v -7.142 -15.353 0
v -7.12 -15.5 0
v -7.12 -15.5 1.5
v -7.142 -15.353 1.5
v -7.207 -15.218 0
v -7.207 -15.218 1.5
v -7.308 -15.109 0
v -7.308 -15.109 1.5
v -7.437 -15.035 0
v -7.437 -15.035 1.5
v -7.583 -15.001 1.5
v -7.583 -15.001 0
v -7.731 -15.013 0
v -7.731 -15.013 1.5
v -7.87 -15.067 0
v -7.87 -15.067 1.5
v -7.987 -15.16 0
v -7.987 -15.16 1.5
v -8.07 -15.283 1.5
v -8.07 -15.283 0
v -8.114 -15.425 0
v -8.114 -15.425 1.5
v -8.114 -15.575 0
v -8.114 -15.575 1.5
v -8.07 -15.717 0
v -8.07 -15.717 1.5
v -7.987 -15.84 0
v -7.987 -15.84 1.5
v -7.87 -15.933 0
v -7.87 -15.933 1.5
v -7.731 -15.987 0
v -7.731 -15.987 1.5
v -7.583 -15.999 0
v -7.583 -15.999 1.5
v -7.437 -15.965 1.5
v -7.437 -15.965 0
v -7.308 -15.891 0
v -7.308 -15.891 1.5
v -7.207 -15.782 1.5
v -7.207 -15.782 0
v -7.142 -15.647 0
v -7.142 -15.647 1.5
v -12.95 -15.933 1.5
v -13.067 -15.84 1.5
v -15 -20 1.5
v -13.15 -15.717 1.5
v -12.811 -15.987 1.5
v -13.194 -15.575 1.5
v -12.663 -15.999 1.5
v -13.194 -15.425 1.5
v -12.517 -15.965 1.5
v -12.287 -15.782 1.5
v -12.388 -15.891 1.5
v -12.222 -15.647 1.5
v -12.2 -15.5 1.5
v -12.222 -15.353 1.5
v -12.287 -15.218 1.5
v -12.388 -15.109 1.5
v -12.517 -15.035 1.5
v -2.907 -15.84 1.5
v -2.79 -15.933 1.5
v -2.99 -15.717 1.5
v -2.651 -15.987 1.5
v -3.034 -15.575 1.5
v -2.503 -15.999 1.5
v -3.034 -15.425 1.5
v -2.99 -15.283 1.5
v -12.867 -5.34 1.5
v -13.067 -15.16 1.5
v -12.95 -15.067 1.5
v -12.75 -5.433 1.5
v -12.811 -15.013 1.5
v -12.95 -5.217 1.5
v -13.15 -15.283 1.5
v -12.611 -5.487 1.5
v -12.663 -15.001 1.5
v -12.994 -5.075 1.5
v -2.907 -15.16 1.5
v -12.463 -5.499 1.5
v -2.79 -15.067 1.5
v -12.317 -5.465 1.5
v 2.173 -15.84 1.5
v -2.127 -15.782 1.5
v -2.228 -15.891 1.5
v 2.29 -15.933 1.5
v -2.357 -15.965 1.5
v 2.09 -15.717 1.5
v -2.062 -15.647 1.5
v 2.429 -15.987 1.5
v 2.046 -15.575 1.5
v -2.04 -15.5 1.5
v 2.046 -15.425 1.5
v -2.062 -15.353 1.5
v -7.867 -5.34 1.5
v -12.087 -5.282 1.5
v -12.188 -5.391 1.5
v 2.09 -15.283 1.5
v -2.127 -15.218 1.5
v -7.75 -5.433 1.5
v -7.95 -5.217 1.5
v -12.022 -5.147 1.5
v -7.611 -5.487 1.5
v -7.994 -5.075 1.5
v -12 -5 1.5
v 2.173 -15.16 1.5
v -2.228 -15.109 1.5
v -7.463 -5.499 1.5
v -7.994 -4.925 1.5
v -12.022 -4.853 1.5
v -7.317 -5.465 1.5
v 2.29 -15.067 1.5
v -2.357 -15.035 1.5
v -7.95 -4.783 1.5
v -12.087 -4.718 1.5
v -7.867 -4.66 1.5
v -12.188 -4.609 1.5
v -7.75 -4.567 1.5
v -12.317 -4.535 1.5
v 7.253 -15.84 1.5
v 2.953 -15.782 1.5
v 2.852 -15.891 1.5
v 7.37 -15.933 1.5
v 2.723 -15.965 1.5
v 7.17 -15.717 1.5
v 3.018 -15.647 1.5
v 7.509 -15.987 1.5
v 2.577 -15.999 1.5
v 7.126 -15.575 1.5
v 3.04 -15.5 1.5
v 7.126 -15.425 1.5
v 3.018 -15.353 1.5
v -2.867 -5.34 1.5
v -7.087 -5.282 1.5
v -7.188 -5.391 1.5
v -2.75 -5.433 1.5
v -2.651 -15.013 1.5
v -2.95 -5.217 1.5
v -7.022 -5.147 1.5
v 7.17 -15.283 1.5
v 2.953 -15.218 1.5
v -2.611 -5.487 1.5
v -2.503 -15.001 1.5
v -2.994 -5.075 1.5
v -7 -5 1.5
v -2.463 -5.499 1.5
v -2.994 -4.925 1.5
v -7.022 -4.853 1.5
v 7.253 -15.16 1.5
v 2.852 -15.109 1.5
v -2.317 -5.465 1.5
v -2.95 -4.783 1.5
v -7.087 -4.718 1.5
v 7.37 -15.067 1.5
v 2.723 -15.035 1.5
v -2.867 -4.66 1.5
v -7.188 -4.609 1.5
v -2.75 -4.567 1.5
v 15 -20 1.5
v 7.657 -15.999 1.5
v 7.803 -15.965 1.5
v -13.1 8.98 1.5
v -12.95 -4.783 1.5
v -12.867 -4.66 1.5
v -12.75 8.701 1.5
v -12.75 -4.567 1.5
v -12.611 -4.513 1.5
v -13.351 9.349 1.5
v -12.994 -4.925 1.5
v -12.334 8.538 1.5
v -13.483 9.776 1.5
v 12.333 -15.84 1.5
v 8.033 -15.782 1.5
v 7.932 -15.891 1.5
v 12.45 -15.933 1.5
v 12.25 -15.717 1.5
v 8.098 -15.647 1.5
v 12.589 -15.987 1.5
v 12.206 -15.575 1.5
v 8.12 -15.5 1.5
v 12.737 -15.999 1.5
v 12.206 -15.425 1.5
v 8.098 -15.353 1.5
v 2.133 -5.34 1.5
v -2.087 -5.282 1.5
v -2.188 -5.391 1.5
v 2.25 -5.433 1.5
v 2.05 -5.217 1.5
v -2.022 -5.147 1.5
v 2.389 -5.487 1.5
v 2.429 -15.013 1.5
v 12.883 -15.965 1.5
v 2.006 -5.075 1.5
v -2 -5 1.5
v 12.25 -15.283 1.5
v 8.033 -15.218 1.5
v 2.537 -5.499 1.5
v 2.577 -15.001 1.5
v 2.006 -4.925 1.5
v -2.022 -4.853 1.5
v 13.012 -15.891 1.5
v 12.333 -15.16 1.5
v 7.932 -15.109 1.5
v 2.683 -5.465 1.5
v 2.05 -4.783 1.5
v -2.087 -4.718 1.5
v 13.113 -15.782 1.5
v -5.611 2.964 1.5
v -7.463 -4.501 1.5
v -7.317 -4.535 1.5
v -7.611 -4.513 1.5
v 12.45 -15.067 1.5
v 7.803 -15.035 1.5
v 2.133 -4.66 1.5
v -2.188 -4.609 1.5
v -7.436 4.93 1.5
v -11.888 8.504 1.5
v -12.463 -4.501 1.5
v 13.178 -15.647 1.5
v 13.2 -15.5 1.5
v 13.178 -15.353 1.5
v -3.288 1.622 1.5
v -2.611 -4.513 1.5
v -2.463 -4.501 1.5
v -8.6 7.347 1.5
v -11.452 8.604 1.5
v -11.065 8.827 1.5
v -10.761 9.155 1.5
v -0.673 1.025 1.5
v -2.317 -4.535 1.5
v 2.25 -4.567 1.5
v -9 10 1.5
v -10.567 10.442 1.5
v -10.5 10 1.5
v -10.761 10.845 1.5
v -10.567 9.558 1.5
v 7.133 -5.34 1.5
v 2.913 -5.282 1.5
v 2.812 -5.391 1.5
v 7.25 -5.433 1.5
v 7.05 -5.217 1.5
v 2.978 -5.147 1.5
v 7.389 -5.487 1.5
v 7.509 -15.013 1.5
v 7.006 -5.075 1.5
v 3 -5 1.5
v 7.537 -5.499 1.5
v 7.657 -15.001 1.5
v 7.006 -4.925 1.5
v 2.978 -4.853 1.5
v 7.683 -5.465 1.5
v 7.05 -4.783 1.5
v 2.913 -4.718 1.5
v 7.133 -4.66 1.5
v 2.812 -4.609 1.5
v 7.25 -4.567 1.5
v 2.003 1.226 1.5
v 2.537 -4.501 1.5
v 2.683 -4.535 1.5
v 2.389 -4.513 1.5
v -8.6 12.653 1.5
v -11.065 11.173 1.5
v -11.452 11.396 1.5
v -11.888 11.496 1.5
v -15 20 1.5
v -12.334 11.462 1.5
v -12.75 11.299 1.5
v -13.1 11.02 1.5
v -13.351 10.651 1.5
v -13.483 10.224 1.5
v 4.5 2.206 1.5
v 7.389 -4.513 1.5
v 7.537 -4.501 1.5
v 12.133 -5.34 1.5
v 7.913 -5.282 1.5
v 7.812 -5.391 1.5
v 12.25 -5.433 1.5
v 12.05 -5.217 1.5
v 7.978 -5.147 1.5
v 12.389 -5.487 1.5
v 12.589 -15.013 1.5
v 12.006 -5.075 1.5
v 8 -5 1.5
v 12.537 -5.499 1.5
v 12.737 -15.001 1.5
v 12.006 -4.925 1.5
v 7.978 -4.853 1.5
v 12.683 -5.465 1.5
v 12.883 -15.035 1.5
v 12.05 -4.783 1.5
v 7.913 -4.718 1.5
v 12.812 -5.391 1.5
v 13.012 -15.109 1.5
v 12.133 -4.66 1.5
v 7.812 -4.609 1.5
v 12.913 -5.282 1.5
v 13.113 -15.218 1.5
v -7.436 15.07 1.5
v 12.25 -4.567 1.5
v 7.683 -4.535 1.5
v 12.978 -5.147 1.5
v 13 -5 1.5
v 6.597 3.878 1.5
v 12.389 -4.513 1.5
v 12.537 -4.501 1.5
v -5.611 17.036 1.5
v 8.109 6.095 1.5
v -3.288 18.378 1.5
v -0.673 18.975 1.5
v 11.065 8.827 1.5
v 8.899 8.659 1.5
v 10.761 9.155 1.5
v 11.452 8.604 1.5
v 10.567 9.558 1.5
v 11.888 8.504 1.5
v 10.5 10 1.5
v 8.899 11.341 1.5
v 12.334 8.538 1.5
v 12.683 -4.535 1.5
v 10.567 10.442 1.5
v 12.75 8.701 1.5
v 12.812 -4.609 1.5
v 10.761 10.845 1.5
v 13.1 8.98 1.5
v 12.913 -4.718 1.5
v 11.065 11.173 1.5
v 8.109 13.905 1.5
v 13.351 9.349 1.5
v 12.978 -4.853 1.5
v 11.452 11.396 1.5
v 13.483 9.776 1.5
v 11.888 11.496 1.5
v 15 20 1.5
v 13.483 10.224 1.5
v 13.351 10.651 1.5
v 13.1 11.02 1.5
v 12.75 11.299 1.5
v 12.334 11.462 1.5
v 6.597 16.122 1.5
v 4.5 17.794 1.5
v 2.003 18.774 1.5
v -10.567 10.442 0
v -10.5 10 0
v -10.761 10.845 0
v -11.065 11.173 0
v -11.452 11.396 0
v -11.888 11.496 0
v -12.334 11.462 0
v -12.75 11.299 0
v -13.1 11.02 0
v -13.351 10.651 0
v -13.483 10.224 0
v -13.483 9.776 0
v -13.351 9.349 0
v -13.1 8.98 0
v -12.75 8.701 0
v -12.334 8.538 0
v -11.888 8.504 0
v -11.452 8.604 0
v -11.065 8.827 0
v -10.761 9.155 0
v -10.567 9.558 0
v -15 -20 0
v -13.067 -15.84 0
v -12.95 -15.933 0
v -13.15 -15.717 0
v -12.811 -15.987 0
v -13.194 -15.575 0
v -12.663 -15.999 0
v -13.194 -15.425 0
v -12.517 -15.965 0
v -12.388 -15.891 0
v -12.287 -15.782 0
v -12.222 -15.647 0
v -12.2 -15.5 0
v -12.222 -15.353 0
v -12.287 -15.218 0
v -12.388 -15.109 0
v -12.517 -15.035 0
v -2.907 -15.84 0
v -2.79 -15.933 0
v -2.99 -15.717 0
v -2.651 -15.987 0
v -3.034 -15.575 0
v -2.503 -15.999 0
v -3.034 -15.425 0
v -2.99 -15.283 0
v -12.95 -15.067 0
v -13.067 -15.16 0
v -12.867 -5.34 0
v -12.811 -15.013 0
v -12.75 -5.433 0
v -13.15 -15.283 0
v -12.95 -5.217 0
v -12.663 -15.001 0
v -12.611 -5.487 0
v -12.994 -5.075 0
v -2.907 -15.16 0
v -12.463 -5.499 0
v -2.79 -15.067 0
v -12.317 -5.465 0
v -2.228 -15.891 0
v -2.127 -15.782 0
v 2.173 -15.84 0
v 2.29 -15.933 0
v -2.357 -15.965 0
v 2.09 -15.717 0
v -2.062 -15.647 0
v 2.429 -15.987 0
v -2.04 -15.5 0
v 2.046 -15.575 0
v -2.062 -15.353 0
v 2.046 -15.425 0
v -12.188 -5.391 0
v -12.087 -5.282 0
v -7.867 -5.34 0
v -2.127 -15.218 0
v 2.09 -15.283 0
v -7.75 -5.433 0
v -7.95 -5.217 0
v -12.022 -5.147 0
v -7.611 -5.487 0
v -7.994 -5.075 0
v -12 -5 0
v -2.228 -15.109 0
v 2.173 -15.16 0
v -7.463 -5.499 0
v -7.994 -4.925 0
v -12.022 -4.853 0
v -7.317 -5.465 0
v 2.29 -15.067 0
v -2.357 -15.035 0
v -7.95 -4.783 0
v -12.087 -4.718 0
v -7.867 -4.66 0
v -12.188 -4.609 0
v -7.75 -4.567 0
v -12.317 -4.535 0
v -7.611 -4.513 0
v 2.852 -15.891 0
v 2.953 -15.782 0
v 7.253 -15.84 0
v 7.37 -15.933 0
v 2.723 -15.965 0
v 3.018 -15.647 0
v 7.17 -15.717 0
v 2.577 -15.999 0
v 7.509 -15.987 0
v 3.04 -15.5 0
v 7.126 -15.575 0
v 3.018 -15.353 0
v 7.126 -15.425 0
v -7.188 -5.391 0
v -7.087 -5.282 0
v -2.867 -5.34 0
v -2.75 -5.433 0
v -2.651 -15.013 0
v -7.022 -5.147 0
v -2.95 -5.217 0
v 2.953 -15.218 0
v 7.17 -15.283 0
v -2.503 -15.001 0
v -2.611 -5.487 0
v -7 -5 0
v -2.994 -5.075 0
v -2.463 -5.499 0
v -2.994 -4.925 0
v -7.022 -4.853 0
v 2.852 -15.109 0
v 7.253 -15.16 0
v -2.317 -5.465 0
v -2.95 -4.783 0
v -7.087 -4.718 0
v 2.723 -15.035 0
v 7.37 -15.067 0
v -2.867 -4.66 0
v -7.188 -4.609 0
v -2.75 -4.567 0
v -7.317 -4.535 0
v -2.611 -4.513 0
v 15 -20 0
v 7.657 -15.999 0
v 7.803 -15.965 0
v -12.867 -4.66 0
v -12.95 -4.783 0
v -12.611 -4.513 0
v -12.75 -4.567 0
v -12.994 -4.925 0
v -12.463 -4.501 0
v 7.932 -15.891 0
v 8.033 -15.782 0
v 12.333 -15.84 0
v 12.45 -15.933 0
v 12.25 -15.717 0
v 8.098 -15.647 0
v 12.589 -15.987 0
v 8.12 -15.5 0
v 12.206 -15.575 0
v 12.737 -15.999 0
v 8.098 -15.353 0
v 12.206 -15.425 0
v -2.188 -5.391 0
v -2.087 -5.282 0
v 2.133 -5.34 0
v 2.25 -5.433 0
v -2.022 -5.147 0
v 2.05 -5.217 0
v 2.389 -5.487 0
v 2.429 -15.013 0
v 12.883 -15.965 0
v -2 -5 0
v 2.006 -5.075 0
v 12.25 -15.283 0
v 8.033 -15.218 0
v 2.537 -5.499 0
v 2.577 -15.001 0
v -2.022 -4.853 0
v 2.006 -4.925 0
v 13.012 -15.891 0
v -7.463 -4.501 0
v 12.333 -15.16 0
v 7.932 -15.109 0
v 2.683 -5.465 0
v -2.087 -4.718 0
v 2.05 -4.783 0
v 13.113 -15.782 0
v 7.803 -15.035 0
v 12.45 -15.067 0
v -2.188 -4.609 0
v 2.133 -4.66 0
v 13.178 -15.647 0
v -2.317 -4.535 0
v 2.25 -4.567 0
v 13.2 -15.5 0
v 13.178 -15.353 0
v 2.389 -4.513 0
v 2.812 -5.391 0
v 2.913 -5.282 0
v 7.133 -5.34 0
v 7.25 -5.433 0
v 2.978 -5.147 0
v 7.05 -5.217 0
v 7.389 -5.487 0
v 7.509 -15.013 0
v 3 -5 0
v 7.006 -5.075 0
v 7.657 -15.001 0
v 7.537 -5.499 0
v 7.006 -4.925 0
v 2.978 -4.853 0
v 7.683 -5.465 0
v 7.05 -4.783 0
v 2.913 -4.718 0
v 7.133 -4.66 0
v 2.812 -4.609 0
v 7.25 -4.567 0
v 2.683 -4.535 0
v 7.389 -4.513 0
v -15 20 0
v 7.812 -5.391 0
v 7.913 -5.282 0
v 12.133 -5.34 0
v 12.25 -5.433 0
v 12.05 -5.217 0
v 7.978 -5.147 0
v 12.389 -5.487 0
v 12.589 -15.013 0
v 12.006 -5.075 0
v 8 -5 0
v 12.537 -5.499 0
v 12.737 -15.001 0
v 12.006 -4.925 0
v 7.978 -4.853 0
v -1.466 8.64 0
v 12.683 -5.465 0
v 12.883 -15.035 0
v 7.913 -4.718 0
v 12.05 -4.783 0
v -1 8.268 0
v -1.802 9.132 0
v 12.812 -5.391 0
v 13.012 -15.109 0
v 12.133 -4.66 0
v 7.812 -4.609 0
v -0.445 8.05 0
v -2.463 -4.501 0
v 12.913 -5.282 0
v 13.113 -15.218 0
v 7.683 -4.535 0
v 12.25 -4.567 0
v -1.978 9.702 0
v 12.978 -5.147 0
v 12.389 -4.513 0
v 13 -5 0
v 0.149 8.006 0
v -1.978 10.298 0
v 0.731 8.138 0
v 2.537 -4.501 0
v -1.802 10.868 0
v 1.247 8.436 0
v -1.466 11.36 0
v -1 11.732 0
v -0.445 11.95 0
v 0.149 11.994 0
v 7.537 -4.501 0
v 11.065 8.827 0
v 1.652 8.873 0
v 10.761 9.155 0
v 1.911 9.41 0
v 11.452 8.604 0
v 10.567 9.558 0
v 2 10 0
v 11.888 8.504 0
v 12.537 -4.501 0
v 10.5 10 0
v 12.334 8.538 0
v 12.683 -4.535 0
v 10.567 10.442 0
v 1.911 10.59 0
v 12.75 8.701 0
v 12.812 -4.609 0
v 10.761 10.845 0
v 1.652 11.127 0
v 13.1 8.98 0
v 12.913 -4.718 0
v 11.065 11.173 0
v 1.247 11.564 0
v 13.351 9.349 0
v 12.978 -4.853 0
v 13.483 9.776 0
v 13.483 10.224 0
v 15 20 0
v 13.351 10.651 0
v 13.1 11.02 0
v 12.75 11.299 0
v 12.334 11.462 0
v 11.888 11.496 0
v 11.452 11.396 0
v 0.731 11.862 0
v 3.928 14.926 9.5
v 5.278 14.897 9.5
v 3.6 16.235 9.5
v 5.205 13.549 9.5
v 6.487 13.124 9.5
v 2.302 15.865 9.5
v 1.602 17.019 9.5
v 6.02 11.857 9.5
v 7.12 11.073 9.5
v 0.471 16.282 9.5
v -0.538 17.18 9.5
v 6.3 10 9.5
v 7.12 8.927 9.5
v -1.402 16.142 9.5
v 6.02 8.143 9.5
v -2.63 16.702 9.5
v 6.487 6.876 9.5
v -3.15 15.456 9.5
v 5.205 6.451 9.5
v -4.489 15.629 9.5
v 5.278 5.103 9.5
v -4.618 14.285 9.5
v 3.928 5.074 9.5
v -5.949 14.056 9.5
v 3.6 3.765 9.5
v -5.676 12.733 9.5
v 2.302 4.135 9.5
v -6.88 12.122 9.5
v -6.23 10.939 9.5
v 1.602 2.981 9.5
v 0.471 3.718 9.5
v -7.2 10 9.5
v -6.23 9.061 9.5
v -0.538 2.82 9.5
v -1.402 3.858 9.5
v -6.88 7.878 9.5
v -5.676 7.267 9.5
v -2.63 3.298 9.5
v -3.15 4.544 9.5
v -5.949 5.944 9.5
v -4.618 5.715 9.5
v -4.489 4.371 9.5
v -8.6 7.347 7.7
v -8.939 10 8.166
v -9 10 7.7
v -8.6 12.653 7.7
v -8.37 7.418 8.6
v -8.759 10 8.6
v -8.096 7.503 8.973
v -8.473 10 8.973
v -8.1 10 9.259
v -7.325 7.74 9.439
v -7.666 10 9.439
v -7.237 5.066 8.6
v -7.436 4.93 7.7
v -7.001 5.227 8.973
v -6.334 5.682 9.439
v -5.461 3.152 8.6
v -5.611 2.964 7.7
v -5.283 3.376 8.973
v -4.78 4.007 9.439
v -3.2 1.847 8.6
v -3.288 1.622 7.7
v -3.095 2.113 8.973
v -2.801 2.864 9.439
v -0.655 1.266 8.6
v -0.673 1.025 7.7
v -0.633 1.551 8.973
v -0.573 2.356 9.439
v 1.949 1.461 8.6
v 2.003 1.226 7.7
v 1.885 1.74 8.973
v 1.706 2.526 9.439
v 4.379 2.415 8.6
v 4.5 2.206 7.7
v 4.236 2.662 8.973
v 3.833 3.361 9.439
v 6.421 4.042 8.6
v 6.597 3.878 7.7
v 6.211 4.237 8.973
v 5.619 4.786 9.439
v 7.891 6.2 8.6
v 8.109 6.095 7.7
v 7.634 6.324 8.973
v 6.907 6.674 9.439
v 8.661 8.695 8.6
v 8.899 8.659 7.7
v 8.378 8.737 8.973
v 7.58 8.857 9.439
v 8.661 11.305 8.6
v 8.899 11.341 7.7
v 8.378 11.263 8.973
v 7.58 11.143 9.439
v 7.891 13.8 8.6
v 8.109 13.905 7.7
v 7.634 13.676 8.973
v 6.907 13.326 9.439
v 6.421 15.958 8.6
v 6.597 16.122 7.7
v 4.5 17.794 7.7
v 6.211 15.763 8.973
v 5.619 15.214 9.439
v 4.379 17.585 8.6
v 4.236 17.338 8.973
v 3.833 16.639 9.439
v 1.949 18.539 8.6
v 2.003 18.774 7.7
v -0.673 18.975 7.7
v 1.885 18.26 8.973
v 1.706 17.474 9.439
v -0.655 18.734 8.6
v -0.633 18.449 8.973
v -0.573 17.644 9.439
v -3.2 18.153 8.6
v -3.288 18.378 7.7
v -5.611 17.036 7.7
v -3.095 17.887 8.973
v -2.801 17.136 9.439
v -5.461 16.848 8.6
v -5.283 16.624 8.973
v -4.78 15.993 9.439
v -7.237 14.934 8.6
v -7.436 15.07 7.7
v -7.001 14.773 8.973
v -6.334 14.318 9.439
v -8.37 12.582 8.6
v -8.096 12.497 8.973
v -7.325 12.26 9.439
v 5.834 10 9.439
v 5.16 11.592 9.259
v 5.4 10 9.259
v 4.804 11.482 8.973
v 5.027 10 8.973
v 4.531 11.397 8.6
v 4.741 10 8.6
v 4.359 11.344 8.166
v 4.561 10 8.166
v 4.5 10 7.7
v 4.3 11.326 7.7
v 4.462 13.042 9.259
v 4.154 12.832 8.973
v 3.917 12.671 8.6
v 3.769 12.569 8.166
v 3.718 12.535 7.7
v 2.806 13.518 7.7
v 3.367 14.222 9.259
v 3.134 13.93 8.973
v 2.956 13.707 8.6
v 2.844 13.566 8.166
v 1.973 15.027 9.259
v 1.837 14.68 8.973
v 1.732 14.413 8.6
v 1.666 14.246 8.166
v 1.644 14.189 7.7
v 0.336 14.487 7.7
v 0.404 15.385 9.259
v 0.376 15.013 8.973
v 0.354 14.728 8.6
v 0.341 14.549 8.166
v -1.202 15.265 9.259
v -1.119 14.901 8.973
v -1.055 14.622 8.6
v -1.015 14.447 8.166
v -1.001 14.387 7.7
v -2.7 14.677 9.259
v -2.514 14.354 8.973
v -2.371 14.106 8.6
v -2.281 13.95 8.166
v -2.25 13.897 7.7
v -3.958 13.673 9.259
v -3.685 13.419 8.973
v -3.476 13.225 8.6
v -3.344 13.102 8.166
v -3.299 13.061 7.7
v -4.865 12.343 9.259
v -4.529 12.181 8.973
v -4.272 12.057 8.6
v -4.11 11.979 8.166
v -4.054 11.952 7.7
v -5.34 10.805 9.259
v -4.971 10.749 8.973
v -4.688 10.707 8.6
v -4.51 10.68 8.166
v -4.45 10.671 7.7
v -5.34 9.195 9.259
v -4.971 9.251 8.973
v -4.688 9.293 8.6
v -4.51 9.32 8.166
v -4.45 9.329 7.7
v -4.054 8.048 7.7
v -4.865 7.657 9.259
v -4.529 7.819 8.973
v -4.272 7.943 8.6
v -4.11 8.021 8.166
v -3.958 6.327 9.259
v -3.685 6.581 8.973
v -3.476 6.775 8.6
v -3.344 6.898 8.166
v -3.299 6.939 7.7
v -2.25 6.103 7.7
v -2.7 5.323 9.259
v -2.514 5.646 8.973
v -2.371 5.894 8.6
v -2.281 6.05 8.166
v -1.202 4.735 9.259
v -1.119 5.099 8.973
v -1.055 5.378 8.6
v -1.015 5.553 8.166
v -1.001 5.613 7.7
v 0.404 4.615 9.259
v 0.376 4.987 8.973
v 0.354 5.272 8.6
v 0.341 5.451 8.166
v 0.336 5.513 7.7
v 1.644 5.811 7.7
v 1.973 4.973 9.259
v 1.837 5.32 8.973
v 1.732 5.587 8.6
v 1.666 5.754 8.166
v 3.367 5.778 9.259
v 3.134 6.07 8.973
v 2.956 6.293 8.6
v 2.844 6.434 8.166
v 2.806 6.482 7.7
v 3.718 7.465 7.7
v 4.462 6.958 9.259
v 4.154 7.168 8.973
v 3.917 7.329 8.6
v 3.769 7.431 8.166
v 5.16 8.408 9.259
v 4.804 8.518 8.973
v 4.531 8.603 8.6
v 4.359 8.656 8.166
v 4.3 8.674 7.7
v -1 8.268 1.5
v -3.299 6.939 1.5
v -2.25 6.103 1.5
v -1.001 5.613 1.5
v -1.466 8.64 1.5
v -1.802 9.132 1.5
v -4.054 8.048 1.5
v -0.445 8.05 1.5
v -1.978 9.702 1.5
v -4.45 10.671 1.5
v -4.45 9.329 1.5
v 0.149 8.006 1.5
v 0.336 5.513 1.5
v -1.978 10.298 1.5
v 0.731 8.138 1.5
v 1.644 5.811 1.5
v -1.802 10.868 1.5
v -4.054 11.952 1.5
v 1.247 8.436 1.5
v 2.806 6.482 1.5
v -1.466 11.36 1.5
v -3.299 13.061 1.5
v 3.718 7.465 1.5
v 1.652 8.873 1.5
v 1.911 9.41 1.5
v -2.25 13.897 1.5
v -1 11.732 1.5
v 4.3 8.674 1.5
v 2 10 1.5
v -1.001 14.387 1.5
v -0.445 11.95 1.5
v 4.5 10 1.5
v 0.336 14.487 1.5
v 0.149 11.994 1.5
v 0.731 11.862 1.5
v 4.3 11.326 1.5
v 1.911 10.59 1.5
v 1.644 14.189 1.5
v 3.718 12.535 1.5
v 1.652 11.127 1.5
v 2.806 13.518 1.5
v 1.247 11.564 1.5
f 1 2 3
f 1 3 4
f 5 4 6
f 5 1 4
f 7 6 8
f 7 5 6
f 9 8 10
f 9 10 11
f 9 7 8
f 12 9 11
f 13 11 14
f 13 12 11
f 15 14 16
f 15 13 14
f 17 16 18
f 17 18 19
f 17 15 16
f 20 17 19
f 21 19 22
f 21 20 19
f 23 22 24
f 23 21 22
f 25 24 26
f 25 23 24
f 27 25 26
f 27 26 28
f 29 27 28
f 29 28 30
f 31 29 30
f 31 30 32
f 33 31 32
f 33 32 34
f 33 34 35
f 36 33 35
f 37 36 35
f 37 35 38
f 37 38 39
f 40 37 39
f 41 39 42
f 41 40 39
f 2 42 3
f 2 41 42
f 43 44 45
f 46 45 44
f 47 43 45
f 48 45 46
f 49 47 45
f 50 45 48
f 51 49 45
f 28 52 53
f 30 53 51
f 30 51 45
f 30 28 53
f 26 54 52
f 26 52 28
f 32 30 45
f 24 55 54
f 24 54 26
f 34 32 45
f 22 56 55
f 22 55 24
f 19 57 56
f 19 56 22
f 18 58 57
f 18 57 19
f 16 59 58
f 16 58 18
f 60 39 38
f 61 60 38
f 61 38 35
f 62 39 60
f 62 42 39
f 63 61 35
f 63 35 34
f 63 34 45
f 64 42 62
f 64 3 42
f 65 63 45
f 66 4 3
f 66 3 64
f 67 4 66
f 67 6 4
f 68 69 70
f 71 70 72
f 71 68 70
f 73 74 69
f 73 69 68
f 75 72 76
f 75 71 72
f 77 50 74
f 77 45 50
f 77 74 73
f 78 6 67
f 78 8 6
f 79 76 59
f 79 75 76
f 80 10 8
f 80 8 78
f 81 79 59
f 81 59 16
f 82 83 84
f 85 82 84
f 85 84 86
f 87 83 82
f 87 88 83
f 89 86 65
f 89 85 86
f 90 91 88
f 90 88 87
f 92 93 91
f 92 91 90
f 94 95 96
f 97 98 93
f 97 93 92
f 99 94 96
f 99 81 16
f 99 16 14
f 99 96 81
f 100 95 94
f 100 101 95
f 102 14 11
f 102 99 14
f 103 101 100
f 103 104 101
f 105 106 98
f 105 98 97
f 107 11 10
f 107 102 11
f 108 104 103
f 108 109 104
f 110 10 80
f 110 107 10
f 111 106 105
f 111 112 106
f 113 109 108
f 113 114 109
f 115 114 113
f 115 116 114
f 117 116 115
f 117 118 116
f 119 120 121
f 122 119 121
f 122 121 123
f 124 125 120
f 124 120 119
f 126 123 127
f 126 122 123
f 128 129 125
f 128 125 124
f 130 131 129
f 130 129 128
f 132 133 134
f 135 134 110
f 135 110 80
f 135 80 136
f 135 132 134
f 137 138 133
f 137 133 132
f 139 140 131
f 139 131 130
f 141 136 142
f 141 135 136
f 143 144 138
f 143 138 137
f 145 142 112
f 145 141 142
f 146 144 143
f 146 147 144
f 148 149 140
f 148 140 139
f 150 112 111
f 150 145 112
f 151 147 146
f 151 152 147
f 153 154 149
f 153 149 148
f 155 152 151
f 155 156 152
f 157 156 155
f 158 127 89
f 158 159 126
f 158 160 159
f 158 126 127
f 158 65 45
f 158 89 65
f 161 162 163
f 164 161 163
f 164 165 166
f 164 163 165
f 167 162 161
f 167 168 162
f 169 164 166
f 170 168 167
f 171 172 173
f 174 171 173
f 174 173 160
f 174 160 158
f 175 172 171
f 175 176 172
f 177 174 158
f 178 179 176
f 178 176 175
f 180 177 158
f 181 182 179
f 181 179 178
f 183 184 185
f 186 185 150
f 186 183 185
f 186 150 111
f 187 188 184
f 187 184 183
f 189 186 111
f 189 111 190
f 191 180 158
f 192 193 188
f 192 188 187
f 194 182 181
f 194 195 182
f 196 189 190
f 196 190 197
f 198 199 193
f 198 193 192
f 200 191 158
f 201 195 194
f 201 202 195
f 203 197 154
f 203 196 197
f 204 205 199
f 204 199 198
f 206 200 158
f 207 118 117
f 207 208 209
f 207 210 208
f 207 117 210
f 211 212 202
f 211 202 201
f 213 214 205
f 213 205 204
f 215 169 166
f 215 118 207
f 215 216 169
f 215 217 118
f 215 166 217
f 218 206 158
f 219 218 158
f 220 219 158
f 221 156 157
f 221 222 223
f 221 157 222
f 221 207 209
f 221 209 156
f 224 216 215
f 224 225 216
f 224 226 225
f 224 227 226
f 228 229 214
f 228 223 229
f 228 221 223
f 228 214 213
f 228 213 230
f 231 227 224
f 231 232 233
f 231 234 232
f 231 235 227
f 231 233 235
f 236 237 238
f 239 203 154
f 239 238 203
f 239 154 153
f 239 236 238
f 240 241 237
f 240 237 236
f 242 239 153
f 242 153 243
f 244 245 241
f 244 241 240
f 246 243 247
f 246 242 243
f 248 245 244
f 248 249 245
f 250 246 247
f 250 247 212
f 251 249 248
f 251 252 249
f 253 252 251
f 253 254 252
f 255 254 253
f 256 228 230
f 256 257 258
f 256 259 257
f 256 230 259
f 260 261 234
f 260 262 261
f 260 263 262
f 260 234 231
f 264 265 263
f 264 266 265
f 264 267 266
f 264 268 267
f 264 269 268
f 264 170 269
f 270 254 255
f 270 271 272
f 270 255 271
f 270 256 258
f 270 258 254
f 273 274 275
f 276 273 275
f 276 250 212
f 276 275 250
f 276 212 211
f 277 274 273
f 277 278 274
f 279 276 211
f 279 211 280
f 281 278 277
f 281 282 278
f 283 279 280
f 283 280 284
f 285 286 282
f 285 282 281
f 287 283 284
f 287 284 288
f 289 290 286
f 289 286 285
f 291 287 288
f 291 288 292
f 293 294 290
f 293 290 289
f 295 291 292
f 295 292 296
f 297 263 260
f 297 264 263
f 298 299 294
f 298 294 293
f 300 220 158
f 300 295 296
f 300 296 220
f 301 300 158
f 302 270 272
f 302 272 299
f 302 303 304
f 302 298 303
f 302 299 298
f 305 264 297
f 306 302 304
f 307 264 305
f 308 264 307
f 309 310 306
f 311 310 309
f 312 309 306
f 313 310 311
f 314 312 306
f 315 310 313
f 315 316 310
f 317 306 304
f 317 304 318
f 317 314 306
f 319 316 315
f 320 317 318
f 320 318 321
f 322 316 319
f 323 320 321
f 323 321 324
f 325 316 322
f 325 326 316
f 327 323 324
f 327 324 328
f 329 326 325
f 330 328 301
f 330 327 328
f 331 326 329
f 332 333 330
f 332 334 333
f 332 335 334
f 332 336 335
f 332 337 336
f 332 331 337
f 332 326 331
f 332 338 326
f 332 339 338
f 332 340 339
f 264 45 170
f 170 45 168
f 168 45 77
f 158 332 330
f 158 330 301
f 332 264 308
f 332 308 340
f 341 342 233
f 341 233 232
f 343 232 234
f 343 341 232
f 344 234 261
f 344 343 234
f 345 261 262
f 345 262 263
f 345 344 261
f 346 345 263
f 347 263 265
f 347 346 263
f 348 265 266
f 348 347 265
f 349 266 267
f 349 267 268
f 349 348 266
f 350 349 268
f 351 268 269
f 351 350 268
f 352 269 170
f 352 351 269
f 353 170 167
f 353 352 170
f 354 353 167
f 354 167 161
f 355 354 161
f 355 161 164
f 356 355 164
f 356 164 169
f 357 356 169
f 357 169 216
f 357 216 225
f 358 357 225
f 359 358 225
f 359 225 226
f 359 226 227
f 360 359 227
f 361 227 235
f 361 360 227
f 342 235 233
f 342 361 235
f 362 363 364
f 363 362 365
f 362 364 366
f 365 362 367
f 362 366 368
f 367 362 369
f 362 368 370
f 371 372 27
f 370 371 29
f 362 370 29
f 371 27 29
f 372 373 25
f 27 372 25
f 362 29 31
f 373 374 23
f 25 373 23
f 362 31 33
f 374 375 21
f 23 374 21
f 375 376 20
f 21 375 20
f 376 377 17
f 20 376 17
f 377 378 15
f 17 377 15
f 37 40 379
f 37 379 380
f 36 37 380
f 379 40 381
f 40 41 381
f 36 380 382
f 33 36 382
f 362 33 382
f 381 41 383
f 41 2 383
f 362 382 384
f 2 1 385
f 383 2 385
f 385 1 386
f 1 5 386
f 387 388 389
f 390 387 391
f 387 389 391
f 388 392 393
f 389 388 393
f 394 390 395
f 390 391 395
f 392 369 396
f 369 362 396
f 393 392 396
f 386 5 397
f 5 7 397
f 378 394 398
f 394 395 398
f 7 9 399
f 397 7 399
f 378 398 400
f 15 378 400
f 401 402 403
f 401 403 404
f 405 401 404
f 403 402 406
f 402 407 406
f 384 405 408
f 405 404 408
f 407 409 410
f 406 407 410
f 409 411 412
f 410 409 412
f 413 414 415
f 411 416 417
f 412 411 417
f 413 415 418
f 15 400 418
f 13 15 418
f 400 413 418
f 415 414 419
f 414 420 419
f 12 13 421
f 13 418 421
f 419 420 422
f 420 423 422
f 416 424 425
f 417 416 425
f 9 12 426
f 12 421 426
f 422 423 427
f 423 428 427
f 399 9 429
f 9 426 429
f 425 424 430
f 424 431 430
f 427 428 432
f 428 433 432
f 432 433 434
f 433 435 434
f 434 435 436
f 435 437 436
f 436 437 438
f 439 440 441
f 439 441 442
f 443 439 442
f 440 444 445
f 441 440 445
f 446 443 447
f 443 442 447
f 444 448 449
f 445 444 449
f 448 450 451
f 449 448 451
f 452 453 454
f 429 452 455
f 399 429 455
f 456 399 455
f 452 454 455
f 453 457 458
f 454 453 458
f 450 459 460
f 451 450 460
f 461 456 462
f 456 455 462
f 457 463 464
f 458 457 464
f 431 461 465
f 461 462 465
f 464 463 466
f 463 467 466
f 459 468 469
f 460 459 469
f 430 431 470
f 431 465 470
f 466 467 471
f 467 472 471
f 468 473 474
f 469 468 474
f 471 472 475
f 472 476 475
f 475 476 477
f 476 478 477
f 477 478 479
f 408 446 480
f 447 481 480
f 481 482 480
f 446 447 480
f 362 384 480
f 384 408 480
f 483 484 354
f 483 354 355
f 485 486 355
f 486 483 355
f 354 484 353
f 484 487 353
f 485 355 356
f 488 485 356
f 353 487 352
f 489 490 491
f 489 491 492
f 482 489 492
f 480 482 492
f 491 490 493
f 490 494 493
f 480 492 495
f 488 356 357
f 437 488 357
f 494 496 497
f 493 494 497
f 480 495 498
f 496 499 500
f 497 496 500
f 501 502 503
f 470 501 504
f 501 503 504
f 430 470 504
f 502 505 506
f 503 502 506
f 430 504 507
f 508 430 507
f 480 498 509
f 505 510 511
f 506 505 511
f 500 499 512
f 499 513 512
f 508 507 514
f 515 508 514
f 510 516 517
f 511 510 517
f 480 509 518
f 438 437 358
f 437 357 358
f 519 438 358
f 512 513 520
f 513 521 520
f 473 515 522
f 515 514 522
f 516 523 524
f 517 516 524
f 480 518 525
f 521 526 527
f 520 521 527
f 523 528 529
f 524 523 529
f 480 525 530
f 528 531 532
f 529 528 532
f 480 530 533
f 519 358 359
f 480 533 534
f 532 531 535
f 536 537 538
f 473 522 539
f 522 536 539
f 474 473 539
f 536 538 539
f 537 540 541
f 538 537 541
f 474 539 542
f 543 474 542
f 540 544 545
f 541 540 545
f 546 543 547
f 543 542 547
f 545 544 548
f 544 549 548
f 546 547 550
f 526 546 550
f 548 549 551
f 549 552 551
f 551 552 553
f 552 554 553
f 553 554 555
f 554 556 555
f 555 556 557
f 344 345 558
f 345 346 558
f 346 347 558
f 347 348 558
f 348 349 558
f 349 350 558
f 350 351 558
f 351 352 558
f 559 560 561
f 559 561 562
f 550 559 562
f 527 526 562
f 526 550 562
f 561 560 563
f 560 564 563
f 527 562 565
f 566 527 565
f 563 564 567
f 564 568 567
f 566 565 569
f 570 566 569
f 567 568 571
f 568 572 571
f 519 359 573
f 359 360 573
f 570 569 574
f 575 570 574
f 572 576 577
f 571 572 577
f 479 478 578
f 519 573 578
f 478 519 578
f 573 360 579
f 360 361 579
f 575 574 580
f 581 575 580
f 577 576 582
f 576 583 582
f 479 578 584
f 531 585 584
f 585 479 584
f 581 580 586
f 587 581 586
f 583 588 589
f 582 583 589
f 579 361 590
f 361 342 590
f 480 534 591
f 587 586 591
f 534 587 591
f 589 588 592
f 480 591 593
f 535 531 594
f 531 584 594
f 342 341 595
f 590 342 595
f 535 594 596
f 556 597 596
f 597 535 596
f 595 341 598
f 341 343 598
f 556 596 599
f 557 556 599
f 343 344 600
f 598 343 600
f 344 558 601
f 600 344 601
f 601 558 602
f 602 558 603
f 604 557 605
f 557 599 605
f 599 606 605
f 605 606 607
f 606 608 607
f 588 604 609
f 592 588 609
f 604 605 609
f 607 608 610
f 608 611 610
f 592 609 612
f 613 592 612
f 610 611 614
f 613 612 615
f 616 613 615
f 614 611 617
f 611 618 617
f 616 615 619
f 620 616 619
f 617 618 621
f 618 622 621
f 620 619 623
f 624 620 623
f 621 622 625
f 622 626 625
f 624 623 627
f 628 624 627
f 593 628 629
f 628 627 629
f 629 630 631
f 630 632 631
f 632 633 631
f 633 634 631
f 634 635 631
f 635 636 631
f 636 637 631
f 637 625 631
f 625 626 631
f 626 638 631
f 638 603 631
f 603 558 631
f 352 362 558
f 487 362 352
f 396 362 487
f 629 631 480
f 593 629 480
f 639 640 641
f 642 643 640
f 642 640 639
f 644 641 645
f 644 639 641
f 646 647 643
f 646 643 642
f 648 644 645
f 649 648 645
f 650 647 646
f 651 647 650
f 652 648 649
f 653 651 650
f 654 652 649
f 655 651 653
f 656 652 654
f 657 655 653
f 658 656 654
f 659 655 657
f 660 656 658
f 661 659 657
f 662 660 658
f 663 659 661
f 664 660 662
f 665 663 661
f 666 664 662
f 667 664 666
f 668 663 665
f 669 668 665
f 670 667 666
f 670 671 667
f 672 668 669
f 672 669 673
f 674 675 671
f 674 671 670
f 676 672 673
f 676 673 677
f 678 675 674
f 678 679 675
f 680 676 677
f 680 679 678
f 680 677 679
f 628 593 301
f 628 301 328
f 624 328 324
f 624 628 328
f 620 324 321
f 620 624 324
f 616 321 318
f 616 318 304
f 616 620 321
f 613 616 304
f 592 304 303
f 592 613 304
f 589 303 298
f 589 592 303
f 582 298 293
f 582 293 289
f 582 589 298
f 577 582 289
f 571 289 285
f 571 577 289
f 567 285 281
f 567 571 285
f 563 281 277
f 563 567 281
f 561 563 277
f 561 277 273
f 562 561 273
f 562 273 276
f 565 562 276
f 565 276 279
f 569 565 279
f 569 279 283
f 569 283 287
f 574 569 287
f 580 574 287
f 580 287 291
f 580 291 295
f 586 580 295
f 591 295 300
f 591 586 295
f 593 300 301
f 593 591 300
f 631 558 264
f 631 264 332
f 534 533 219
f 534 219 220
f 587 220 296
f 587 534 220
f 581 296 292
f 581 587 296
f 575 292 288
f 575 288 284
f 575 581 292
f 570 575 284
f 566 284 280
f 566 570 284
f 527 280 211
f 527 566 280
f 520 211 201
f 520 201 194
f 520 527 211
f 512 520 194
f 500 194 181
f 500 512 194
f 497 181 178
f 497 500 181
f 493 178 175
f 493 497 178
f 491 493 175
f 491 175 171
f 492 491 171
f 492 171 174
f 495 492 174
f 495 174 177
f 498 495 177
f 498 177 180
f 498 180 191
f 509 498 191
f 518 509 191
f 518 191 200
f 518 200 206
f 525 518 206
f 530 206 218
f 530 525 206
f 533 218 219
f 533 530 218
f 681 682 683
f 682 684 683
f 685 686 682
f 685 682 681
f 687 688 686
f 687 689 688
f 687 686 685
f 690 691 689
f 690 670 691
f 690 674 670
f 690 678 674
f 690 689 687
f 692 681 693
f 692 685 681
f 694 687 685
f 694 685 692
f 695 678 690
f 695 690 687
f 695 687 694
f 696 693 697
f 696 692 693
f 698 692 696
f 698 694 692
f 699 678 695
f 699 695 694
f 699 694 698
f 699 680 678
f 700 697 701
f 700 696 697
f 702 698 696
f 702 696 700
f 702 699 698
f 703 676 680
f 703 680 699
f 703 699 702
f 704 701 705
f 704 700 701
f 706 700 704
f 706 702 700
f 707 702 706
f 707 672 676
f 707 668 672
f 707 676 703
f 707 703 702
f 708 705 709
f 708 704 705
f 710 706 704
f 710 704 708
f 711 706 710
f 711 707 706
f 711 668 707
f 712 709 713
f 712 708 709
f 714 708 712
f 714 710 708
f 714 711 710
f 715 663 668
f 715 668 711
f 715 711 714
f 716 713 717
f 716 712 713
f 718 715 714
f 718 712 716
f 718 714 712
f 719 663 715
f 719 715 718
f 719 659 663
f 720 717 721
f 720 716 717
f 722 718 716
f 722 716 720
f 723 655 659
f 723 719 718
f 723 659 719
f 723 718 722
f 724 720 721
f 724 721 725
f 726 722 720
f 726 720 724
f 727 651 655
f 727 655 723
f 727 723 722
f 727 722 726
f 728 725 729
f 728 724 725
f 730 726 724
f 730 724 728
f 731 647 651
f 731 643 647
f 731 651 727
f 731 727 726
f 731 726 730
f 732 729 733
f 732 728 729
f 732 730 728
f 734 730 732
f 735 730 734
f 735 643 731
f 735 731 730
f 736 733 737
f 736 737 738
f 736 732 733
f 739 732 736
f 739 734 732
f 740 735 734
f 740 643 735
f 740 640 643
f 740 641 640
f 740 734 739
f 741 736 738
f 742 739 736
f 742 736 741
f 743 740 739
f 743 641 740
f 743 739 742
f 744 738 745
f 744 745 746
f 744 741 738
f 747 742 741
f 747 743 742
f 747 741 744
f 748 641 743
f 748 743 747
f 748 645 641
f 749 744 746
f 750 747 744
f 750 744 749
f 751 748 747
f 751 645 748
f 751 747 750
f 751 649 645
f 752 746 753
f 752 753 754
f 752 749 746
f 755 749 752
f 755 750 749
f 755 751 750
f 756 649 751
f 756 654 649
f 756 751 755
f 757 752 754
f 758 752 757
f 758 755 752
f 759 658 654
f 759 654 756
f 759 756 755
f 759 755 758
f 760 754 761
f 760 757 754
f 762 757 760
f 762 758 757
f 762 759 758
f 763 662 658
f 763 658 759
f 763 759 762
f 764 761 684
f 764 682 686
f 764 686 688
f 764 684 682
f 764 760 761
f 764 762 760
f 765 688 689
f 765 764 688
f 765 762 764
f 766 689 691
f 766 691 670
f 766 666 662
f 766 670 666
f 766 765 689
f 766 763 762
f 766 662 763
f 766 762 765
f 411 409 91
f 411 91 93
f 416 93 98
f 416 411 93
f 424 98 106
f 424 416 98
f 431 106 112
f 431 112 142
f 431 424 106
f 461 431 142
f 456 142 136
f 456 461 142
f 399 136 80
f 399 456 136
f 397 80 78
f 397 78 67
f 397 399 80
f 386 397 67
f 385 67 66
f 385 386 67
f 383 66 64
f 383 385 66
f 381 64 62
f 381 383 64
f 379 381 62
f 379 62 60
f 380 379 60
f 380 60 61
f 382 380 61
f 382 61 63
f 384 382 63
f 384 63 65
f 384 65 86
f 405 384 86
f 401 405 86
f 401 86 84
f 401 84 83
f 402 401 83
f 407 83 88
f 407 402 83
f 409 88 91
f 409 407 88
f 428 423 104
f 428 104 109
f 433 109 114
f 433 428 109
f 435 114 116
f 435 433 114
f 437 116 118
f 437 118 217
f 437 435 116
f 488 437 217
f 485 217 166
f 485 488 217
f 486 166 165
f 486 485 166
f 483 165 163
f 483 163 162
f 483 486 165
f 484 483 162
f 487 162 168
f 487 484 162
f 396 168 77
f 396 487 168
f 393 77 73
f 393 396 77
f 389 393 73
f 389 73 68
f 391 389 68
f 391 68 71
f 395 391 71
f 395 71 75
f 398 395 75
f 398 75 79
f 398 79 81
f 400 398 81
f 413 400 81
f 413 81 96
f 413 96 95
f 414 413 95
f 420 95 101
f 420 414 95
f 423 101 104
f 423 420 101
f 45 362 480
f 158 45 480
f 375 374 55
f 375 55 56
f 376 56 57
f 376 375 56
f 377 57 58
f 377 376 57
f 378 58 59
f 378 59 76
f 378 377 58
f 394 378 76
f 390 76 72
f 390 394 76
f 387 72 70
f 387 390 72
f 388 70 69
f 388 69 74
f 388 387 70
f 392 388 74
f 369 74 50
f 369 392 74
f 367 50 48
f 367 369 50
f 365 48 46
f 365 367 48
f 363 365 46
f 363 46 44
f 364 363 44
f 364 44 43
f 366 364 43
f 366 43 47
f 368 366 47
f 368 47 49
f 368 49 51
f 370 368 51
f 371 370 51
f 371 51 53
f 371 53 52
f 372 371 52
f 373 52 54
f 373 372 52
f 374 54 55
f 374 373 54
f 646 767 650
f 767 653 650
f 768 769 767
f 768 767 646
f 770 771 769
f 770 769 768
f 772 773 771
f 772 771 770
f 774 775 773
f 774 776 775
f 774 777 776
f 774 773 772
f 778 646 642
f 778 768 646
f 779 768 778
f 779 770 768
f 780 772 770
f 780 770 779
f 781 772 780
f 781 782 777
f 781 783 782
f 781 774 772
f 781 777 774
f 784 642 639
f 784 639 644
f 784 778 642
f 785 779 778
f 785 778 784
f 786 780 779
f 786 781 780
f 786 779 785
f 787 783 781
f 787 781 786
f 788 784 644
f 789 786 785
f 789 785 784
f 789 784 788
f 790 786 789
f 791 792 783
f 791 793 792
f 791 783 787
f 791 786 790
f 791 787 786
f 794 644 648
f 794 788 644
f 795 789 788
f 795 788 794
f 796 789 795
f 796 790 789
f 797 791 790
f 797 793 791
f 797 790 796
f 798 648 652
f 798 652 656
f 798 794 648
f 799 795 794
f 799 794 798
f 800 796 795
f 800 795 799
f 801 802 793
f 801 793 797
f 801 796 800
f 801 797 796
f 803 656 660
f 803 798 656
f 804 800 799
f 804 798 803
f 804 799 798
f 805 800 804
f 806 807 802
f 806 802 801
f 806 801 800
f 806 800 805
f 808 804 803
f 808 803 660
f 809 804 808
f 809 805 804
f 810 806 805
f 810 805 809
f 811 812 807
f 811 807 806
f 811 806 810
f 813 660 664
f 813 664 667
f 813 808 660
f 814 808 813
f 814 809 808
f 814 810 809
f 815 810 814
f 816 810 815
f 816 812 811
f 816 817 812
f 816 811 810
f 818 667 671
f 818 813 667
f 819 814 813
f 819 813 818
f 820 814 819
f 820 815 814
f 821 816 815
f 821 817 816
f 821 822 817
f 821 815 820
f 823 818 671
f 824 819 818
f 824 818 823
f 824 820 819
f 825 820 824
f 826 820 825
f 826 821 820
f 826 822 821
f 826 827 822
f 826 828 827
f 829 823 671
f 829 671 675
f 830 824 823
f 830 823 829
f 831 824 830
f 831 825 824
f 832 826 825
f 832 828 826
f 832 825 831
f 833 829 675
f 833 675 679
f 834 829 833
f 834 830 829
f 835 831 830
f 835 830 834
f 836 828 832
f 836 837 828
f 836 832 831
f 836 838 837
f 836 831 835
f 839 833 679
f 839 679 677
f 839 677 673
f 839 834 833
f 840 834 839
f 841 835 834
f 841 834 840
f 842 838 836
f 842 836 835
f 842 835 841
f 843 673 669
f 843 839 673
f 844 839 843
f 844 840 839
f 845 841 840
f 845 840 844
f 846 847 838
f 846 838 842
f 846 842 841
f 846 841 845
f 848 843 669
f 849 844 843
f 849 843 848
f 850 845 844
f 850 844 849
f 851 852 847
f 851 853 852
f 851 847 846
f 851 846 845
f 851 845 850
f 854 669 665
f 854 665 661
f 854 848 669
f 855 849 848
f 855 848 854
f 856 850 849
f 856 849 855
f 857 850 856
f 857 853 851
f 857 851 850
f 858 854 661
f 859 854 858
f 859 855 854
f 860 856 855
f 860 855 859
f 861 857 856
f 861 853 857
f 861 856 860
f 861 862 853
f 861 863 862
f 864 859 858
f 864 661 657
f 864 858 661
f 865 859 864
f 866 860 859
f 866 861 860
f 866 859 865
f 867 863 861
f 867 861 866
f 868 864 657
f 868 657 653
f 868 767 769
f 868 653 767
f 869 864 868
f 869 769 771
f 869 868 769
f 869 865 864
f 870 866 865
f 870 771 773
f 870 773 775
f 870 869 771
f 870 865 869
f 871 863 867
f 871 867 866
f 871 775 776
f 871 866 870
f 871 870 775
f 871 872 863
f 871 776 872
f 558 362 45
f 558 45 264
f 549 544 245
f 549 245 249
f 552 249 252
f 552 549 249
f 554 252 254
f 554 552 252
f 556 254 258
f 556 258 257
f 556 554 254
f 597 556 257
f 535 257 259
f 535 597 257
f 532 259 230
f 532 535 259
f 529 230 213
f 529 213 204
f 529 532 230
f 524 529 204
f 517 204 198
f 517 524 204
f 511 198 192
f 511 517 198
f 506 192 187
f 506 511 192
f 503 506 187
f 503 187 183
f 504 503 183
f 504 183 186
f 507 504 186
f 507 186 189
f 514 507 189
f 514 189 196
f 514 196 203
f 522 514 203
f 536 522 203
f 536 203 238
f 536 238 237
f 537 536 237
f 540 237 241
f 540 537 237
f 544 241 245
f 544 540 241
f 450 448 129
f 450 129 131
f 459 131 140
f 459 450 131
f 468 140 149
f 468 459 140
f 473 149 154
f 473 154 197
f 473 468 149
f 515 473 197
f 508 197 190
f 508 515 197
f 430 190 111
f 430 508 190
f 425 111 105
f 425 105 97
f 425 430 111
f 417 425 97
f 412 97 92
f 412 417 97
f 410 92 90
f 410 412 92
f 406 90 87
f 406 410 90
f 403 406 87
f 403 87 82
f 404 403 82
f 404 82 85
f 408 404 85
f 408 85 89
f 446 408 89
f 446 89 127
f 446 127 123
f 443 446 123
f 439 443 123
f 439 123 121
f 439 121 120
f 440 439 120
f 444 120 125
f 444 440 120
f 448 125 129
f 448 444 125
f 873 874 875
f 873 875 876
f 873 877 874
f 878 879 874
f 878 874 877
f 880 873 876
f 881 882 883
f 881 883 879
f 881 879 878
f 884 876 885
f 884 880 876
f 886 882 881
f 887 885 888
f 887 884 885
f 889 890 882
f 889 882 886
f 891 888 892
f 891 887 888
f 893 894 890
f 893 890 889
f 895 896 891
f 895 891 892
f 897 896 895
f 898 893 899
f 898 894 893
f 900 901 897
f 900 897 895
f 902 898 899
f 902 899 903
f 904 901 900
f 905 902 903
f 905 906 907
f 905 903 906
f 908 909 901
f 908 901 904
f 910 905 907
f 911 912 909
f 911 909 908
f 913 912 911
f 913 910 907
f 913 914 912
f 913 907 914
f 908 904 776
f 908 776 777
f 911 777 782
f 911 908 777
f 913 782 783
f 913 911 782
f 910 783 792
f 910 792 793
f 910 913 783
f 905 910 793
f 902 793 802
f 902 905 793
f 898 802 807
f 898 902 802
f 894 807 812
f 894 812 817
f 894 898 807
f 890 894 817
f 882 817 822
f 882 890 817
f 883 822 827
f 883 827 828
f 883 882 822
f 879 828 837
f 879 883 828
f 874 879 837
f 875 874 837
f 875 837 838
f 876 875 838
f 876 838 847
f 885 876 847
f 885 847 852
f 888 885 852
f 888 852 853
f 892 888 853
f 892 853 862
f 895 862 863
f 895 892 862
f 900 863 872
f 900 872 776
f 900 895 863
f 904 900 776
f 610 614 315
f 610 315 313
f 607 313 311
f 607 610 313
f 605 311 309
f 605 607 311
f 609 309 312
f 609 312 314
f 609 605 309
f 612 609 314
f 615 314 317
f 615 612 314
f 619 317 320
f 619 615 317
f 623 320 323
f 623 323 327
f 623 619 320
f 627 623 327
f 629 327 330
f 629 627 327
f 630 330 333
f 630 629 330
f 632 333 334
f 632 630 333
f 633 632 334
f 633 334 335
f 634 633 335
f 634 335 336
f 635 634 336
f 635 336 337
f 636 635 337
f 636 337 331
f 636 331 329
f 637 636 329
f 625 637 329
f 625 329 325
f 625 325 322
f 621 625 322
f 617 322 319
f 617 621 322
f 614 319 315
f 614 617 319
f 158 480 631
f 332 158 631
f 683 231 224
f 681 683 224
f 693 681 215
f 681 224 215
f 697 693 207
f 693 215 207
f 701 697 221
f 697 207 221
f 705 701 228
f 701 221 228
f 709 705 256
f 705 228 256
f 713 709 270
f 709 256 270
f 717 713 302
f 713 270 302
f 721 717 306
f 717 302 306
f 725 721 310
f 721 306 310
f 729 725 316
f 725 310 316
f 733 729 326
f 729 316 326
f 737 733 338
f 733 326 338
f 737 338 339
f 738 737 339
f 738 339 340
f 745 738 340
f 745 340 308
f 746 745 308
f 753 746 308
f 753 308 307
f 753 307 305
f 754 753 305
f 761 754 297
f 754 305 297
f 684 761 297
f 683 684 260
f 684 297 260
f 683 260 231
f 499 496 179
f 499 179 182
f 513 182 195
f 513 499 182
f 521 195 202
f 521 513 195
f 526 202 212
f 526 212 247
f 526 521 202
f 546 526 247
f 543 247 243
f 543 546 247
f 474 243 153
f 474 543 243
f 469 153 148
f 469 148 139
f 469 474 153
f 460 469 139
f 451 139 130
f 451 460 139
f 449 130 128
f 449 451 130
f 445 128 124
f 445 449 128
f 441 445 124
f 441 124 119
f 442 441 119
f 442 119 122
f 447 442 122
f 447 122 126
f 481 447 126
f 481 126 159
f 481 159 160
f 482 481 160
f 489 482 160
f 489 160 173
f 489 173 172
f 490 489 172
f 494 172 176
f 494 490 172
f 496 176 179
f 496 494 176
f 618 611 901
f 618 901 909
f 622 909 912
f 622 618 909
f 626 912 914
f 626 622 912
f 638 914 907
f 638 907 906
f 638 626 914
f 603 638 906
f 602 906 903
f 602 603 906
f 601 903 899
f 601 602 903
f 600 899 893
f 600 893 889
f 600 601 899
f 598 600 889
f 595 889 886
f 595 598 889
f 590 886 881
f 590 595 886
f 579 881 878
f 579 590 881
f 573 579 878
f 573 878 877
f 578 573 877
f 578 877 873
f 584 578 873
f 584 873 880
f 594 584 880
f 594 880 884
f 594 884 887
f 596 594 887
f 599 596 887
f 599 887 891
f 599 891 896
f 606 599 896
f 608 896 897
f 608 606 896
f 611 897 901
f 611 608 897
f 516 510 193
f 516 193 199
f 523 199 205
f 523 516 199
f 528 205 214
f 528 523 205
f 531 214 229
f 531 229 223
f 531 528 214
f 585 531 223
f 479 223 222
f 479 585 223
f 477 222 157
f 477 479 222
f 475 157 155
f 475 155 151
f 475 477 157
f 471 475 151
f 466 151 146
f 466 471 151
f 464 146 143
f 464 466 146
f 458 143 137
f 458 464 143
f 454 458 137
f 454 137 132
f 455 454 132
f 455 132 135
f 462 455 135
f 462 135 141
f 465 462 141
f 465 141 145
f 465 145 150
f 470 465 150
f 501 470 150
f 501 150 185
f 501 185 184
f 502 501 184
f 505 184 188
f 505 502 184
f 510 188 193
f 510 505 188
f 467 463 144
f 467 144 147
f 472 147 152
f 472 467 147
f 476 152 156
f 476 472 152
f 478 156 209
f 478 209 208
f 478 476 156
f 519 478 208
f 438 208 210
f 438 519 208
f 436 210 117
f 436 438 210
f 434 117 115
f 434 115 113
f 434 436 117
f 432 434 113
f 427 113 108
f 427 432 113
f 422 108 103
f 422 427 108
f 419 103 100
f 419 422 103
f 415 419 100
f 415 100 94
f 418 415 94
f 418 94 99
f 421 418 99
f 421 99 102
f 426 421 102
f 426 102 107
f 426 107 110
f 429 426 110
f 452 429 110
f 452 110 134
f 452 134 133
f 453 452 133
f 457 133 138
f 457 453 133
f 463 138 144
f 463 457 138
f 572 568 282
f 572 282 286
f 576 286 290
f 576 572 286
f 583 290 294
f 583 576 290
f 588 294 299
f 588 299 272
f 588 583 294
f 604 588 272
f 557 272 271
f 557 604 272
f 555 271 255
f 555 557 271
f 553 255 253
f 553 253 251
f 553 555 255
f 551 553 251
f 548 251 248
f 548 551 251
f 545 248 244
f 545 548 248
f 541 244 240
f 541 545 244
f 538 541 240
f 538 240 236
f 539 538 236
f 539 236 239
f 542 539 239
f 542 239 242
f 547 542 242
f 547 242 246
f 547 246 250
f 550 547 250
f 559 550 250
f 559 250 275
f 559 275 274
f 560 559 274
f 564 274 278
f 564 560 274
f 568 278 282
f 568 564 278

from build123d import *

# Parameters (mm, degrees)
SKETCH_1_W      = 30
SKETCH_1_H      = 40
SKETCH_1_R      = 0.5
SKETCH_1_R_2    = 2
SKETCH_1_R_3    = 1.5
EXTRUDE_1_DEPTH = 1.5
SKETCH_2_R      = 9
SKETCH_2_R_2    = 4.5
EXTRUDE_2_DEPTH = 8
FILLET_1_R      = 1.8


with BuildPart() as part:
    # Эскиз1 → Вытянуть1 (new body)
    with BuildSketch(Plane.XY):
        Rectangle(SKETCH_1_W, SKETCH_1_H)
        with Locations((-12.7, -15.5)):
            Circle(SKETCH_1_R, mode=Mode.SUBTRACT)
        with Locations((-12.5, -5)):
            Circle(SKETCH_1_R, mode=Mode.SUBTRACT)
        with Locations((-7.62, -15.5)):
            Circle(SKETCH_1_R, mode=Mode.SUBTRACT)
        with Locations((-2.54, -15.5)):
            Circle(SKETCH_1_R, mode=Mode.SUBTRACT)
        with Locations((2.54, -15.5)):
            Circle(SKETCH_1_R, mode=Mode.SUBTRACT)
        with Locations((7.62, -15.5)):
            Circle(SKETCH_1_R, mode=Mode.SUBTRACT)
        with Locations((12.7, -15.5)):
            Circle(SKETCH_1_R, mode=Mode.SUBTRACT)
        with Locations((-7.5, -5)):
            Circle(SKETCH_1_R, mode=Mode.SUBTRACT)
        with Locations((-2.5, -5)):
            Circle(SKETCH_1_R, mode=Mode.SUBTRACT)
        with Locations((2.5, -5)):
            Circle(SKETCH_1_R, mode=Mode.SUBTRACT)
        with Locations((7.5, -5)):
            Circle(SKETCH_1_R, mode=Mode.SUBTRACT)
        with Locations((12.5, -5)):
            Circle(SKETCH_1_R, mode=Mode.SUBTRACT)
        with Locations((0, 10)):
            Circle(SKETCH_1_R_2, mode=Mode.SUBTRACT)
        with Locations((-12, 10)):
            Circle(SKETCH_1_R_3, mode=Mode.SUBTRACT)
        with Locations(Location((12, 10, 0), (0, 0, 180))):
            Circle(SKETCH_1_R_3, mode=Mode.SUBTRACT)
    extrude(amount=EXTRUDE_1_DEPTH)

    # Эскиз2 → Вытянуть2 (add)
    with BuildSketch(Plane.XY.offset(1.5)):
        with Locations(Location((0, 10, 0), (0, 0, 180))):
            Circle(SKETCH_2_R)
        with Locations((0, 10)):
            Circle(SKETCH_2_R_2, mode=Mode.SUBTRACT)
    extrude(amount=EXTRUDE_2_DEPTH)

    # Скругление1
    fillet_1_edges = [part.edges().sort_by_distance(p)[0] for p in [
        (9, 10, 9.5),
        (-4.5, 10, 9.5),
    ]]
    fillet(fillet_1_edges, radius=FILLET_1_R)


solid = part.part
